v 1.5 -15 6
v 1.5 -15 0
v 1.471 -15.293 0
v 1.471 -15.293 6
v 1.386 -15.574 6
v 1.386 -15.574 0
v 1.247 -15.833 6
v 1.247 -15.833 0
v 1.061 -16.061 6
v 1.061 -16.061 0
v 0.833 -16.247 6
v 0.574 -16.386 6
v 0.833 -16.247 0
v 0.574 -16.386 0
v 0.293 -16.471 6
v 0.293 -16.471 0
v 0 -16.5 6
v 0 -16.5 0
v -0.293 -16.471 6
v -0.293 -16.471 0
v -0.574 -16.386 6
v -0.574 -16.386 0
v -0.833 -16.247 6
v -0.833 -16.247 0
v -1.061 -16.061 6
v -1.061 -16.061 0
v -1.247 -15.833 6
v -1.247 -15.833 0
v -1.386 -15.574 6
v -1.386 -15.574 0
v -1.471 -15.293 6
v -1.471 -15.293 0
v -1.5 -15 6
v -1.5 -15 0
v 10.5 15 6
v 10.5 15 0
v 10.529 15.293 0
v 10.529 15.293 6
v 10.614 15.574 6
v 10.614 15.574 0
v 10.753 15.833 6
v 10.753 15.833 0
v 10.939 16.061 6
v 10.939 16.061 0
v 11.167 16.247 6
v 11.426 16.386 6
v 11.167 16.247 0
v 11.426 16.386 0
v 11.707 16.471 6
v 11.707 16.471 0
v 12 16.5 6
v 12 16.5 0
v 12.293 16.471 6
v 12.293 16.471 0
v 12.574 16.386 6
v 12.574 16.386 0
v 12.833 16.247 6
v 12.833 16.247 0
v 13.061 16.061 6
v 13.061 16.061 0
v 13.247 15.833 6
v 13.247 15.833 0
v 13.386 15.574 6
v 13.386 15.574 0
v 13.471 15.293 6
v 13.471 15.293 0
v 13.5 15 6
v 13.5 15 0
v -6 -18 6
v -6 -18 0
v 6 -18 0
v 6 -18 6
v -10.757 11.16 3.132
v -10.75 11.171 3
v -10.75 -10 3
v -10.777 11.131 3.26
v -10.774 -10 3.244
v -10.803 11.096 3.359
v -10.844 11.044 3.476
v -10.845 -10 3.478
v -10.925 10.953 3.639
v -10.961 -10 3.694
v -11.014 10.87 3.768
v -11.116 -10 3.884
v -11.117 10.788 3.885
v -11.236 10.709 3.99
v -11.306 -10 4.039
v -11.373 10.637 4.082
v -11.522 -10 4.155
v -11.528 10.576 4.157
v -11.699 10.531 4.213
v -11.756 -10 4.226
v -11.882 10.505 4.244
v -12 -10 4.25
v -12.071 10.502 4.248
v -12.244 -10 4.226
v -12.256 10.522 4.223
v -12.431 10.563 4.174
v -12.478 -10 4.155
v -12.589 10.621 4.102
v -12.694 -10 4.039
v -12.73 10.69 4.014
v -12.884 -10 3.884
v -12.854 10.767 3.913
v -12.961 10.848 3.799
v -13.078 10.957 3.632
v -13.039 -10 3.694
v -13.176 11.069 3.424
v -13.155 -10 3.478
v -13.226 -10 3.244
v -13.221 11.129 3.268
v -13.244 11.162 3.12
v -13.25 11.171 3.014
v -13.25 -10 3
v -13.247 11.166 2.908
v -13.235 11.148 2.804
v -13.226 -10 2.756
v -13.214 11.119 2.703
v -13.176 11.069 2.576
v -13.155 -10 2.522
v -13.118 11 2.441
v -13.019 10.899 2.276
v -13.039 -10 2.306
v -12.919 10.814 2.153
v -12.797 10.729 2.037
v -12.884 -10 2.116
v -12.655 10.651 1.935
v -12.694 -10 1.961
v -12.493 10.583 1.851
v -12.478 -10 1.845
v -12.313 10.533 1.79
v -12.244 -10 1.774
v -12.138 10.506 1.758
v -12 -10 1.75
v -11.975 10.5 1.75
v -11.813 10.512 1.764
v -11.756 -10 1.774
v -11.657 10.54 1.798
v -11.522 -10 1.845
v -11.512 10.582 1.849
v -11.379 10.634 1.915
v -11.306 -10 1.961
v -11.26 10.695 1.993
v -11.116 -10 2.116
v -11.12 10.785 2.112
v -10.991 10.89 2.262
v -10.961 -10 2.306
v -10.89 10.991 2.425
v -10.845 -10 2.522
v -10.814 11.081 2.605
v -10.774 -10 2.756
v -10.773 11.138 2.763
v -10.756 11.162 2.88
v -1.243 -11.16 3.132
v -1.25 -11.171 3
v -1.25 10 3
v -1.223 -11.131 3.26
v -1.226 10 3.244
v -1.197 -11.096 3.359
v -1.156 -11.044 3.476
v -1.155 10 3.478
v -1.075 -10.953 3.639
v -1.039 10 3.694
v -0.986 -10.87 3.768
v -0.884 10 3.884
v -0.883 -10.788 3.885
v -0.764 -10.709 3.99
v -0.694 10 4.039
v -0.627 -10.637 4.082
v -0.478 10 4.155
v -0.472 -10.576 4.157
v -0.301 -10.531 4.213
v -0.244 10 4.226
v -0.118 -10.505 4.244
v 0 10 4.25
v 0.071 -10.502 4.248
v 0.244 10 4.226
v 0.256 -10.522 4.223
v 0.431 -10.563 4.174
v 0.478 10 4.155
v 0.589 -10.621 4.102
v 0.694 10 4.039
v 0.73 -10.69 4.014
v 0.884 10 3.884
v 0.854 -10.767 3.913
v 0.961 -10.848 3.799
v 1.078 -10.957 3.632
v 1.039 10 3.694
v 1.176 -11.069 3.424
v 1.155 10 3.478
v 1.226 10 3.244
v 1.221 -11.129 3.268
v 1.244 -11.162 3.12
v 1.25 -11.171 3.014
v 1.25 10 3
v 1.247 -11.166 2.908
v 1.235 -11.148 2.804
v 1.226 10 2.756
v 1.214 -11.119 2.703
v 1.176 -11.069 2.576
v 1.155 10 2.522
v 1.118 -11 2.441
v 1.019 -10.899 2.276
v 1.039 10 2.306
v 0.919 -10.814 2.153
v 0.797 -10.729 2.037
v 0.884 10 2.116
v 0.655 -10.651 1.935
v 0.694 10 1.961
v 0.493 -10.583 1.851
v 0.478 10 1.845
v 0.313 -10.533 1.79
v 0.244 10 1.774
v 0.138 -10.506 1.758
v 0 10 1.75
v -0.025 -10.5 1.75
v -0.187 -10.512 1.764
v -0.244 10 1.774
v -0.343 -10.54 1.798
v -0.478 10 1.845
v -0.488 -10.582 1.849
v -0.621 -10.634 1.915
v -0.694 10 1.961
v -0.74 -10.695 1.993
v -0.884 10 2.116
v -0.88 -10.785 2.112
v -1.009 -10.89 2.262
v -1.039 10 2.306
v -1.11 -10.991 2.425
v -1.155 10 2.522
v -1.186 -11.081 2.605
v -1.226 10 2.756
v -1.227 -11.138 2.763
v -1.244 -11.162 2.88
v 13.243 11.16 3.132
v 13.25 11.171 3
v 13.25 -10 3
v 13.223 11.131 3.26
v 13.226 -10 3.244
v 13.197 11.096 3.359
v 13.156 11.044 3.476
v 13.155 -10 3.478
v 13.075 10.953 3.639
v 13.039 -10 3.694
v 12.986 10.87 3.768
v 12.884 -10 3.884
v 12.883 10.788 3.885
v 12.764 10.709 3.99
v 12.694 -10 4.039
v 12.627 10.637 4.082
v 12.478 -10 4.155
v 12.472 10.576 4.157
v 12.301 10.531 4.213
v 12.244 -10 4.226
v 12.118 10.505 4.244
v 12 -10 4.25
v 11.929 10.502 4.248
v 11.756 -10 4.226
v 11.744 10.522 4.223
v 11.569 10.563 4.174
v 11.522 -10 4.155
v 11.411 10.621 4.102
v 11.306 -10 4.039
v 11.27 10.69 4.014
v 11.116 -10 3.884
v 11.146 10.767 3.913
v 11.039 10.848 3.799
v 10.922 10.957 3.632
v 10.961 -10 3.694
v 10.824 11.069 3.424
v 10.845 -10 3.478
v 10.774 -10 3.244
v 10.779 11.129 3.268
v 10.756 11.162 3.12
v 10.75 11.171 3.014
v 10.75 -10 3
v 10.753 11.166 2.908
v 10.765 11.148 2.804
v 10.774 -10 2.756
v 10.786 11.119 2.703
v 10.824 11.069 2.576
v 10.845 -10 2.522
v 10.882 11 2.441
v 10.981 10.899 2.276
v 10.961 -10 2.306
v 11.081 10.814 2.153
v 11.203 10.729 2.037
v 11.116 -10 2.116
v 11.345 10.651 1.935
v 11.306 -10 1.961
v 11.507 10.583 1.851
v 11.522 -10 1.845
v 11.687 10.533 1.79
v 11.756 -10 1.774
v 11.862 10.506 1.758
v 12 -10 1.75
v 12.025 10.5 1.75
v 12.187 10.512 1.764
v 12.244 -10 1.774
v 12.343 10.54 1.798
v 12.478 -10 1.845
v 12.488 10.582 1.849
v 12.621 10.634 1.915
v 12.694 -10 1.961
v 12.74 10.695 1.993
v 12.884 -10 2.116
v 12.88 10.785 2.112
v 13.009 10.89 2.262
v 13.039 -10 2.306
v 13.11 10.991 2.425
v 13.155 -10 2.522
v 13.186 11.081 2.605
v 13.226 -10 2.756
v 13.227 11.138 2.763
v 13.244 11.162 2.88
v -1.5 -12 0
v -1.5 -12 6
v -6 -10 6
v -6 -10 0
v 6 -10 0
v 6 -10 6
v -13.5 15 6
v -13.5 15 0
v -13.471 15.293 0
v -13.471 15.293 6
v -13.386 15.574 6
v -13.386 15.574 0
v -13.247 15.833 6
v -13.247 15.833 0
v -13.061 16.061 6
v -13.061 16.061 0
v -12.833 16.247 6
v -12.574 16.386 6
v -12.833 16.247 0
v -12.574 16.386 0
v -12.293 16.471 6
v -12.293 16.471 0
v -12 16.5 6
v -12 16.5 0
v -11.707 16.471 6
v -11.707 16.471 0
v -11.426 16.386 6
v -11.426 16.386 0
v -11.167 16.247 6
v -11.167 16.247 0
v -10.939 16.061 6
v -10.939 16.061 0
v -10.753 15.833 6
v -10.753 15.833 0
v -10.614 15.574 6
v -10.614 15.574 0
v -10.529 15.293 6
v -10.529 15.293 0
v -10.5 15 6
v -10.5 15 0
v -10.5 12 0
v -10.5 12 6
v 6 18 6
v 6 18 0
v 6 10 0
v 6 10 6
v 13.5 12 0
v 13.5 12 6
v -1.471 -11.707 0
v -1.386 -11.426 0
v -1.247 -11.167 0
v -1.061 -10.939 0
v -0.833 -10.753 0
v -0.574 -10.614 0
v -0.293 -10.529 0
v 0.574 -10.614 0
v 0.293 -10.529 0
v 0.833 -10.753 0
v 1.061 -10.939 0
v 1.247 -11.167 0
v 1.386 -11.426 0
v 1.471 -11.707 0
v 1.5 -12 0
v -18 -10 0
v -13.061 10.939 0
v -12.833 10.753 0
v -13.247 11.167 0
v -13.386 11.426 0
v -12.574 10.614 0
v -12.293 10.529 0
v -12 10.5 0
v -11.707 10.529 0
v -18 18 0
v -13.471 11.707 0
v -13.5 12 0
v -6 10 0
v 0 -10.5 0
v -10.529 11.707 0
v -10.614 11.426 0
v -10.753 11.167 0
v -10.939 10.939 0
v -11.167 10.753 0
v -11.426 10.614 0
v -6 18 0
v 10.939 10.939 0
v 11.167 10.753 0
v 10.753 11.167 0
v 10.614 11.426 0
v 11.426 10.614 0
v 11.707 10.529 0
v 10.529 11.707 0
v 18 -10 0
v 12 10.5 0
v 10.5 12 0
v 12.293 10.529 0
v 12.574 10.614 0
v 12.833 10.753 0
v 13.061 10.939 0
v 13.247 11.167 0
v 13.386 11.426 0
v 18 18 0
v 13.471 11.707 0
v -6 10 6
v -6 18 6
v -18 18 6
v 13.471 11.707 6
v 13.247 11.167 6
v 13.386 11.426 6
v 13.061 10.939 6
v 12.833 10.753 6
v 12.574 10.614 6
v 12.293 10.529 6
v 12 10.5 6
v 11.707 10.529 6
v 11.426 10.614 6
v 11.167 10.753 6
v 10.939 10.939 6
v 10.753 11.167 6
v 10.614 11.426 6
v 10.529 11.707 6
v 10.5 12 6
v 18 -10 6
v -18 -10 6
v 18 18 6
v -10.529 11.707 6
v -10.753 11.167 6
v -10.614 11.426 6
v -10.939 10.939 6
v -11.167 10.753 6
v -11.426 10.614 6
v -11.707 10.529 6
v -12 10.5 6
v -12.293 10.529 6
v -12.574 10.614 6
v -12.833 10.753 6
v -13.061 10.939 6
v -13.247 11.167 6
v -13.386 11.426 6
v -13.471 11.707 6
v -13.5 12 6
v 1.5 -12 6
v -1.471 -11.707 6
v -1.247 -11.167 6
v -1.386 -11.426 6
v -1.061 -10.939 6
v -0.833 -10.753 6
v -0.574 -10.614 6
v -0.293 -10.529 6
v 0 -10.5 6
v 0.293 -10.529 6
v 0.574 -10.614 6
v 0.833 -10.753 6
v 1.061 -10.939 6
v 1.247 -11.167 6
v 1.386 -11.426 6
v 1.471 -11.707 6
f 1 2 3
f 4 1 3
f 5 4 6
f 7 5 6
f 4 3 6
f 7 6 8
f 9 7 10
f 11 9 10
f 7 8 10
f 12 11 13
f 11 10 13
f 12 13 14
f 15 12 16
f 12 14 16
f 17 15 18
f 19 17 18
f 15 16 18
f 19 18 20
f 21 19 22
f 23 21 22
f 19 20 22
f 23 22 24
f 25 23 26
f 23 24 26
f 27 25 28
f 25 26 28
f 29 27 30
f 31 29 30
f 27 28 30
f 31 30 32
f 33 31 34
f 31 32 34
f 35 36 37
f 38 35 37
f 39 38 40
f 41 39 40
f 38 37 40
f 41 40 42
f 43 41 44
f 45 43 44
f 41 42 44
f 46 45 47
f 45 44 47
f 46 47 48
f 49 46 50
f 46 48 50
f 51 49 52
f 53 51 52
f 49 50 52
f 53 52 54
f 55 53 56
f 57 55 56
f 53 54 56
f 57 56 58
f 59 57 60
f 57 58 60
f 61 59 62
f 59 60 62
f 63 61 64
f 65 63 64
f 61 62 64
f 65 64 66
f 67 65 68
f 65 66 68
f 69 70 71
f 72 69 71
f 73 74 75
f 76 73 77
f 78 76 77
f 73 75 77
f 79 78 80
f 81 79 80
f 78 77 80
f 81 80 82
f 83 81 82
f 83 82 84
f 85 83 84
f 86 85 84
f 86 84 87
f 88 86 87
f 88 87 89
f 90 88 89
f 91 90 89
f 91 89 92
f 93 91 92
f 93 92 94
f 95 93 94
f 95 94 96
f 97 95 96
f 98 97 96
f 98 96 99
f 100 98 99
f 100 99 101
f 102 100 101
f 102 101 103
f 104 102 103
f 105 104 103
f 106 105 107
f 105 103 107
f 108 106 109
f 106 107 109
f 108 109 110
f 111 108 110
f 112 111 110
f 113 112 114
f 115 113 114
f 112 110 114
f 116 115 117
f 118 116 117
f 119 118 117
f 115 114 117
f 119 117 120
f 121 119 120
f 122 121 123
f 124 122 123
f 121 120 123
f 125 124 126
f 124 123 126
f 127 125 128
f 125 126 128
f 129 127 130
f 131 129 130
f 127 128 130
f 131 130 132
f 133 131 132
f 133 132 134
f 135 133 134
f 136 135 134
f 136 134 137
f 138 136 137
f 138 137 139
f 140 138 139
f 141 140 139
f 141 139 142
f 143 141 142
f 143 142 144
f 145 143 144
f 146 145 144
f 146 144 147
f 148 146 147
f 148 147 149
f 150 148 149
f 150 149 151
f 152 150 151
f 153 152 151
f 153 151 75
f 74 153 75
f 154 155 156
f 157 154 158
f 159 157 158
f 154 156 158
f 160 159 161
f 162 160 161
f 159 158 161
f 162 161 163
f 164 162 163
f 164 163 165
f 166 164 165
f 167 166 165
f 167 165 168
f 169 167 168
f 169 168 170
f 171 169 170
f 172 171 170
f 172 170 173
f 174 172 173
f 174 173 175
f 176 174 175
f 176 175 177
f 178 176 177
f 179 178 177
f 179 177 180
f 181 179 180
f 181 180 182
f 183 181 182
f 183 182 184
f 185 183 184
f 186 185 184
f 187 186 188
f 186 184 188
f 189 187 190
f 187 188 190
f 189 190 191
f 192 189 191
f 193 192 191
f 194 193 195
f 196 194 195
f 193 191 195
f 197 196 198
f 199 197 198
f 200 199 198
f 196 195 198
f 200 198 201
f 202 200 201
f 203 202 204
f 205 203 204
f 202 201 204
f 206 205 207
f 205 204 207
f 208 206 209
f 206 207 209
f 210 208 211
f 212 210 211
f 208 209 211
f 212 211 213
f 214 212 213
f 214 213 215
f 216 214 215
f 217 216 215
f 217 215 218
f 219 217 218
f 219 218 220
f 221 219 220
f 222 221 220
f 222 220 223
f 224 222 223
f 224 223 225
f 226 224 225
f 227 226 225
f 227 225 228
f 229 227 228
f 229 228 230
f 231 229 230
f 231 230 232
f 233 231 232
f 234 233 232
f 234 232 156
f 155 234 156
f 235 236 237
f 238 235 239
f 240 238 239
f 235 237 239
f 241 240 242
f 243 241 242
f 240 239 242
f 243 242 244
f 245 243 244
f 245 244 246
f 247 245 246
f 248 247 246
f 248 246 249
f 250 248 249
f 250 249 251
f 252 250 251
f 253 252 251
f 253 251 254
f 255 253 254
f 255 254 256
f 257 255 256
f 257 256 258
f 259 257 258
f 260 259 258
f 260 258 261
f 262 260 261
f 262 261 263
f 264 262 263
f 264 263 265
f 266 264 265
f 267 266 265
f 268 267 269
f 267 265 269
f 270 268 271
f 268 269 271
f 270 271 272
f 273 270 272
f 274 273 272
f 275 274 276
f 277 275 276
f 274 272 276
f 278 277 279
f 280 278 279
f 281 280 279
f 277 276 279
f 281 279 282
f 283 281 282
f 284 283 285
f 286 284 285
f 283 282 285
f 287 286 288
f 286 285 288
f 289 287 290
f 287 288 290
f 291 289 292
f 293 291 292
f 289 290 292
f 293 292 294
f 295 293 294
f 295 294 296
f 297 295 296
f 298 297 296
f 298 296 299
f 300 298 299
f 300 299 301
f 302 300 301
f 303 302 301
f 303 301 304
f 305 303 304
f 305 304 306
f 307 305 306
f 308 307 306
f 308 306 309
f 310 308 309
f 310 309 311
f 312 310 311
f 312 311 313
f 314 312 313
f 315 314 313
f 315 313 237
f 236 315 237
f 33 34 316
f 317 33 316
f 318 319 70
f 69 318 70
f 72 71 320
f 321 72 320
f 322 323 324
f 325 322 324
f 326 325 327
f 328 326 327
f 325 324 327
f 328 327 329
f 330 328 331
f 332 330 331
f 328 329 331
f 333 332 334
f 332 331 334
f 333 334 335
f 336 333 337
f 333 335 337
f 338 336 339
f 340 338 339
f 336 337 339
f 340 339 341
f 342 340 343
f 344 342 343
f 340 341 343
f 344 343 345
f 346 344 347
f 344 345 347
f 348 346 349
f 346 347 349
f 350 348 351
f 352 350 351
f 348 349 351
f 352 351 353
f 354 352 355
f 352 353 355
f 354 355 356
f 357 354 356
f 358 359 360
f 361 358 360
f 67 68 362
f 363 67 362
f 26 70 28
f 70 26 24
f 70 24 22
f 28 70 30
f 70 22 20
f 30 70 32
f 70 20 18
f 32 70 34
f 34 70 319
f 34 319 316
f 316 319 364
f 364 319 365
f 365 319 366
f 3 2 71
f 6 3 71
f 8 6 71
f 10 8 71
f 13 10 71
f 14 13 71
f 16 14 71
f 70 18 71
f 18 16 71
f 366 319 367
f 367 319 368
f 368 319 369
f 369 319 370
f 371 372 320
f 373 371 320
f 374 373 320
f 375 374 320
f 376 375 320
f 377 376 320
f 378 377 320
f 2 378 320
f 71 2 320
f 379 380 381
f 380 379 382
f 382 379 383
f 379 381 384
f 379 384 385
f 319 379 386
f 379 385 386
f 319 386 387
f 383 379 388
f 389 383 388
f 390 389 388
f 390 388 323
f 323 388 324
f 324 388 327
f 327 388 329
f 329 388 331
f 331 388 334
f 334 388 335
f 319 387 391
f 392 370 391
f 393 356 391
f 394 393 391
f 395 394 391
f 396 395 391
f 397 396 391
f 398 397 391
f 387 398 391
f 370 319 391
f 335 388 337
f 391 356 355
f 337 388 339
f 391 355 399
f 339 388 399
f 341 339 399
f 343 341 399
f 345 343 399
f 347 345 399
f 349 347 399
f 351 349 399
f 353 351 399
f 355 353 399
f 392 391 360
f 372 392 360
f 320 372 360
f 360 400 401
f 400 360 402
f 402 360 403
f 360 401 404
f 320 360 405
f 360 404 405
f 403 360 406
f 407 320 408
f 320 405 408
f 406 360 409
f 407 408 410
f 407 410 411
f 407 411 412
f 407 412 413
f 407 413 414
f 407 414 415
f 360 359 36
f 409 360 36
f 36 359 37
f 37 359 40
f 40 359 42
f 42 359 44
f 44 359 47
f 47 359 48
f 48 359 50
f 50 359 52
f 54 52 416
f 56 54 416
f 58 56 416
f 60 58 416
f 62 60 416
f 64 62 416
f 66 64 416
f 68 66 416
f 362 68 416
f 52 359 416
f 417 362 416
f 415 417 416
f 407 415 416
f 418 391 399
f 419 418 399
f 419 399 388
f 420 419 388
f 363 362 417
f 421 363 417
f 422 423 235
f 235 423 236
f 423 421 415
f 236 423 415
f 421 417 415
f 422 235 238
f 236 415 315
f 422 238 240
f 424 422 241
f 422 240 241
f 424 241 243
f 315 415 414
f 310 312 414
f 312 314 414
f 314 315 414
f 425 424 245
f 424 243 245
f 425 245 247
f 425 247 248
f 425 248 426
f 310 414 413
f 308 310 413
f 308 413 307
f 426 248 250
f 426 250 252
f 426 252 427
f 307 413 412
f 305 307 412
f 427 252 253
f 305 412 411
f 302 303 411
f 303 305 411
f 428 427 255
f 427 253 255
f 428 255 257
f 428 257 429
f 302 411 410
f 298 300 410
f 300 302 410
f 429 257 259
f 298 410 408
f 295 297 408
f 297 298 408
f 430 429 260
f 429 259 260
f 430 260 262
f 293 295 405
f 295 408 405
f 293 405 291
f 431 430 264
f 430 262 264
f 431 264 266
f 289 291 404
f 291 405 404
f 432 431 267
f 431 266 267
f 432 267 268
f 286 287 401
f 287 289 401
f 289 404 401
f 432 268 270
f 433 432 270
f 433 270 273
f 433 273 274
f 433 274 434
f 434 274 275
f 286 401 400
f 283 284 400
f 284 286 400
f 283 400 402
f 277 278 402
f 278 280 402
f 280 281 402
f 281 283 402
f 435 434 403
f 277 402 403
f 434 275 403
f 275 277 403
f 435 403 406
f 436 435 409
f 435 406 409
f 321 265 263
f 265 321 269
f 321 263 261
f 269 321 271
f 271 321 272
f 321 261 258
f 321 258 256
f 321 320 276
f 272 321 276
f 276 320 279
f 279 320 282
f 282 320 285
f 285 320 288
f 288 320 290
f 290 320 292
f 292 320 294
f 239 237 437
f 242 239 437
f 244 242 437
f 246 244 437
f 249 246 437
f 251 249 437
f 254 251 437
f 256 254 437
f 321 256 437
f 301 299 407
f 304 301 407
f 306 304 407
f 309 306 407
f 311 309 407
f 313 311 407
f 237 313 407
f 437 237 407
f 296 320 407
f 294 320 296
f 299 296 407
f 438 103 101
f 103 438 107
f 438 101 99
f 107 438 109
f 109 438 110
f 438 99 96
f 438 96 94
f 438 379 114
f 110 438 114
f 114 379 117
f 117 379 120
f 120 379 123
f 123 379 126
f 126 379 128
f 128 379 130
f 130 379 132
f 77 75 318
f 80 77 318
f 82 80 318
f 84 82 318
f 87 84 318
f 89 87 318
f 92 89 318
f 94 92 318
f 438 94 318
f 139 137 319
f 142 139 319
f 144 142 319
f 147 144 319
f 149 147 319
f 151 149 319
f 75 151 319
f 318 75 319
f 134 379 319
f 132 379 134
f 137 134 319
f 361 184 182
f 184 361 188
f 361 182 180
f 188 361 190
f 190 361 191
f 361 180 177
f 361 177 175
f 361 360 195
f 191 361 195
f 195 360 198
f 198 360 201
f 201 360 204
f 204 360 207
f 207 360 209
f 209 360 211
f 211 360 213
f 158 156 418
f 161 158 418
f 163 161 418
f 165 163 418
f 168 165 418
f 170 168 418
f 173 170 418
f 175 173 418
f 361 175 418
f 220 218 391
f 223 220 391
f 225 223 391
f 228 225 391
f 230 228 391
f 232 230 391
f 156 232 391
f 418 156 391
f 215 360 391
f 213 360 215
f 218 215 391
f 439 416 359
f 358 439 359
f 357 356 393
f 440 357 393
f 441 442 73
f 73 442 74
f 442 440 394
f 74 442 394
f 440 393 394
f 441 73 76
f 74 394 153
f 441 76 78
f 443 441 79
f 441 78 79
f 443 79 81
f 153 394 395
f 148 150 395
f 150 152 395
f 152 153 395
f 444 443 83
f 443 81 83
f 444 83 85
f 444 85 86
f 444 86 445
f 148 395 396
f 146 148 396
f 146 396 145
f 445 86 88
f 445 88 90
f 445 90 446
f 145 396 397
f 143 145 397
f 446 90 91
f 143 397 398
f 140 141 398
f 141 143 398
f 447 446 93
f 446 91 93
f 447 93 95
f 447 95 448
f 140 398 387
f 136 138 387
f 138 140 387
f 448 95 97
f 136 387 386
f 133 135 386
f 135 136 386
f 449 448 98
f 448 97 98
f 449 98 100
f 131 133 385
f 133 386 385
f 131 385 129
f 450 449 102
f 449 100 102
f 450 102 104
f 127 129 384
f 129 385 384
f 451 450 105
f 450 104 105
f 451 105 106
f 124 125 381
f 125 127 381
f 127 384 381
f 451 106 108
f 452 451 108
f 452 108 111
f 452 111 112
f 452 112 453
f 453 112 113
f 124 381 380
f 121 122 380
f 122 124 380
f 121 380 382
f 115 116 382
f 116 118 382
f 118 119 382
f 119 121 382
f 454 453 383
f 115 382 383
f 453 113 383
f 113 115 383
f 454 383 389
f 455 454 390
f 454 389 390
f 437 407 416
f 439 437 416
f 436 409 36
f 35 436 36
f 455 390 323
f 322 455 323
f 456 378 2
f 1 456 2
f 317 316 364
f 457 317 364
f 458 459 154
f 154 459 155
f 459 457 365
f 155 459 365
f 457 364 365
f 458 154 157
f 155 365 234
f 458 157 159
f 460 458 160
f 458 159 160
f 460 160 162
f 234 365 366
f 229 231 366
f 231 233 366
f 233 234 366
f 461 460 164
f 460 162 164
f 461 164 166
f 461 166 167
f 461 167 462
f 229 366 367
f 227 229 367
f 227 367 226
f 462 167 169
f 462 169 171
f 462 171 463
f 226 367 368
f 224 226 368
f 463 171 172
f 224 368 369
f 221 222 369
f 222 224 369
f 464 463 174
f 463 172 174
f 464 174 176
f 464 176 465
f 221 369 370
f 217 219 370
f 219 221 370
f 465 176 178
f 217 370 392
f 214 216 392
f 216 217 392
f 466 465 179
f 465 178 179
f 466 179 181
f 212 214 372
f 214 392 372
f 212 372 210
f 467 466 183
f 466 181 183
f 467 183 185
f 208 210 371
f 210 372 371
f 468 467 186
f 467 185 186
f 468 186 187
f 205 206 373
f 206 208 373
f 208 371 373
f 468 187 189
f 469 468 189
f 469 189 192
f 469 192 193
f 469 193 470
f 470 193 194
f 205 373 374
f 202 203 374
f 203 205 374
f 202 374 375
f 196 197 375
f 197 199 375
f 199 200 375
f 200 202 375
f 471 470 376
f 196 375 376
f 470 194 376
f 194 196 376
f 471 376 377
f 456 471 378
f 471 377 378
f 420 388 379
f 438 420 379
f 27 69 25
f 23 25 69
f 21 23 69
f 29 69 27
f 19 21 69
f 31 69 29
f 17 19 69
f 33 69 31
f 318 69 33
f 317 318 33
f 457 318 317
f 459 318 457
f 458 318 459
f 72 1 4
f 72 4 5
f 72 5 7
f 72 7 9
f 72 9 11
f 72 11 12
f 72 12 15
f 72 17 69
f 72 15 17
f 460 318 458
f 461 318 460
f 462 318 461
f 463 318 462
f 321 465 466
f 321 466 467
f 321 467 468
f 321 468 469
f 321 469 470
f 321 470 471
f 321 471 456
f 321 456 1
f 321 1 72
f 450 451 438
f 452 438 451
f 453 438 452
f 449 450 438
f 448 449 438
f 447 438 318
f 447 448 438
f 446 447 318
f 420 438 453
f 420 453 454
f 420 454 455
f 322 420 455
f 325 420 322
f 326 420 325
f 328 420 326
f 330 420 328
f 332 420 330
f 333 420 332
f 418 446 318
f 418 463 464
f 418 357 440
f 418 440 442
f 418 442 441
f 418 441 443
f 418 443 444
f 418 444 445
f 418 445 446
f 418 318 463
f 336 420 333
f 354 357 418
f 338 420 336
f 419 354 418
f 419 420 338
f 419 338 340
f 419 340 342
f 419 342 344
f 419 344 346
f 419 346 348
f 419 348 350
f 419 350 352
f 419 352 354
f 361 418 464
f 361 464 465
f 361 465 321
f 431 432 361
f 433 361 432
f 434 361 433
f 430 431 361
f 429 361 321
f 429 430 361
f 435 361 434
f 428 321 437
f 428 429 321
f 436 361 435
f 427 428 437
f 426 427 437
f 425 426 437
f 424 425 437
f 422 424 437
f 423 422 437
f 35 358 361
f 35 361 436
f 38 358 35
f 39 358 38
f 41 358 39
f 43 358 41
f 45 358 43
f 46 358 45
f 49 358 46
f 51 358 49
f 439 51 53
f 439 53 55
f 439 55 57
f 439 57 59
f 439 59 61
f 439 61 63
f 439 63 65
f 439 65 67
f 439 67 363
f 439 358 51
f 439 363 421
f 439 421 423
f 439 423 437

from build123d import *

# Parameters (mm, degrees)
F1_DEPTH = 6
F2_DEPTH = 6
F3_R     = 1.25
F4_DEPTH = 21.1718439024
F5_R     = 1.25
F6_DEPTH = 21.1718439024


with BuildPart() as f1:
    # F0 (on Top) → F1 (new body)
    with BuildSketch(Plane.XY):
        Polygon((-6, -18), (6, -18), (6, -10), (18, -10), (18, 18), (6, 18), (6, 10), (-6, 10), (-6, 18), (-18, 18), (-18, -10), (-6, -10), align=None)
        with BuildLine():
            Line((1.5, -12), (1.5, -15))
            ThreePointArc((1.5, -15), (0, -16.5), (-1.5, -15))
            Line((-1.5, -15), (-1.5, -12))
            ThreePointArc((-1.5, -12), (0, -10.5), (1.5, -12))
        make_face(mode=Mode.SUBTRACT)
        with BuildLine():
            ThreePointArc((-13.5, 15), (-12, 16.5), (-10.5, 15))
            Line((-10.5, 15), (-10.5, 12))
            ThreePointArc((-10.5, 12), (-12, 10.5), (-13.5, 12))
            Line((-13.5, 12), (-13.5, 15))
        make_face(mode=Mode.SUBTRACT)
        with BuildLine():
            Line((10.5, 12), (10.5, 15))
            ThreePointArc((10.5, 15), (12, 16.5), (13.5, 15))
            Line((13.5, 15), (13.5, 12))
            ThreePointArc((13.5, 12), (12, 10.5), (10.5, 12))
        make_face(mode=Mode.SUBTRACT)
    extrude(amount=F1_DEPTH)

    # F0 (on Top) → F2 (join)
    with BuildSketch(Plane.XY):
        Polygon((-6, -18), (6, -18), (6, -10), (18, -10), (18, 18), (6, 18), (6, 10), (-6, 10), (-6, 18), (-18, 18), (-18, -10), (-6, -10), align=None)
        with BuildLine():
            Line((1.5, -12), (1.5, -15))
            ThreePointArc((1.5, -15), (0, -16.5), (-1.5, -15))
            Line((-1.5, -15), (-1.5, -12))
            ThreePointArc((-1.5, -12), (0, -10.5), (1.5, -12))
        make_face(mode=Mode.SUBTRACT)
        with BuildLine():
            ThreePointArc((-13.5, 15), (-12, 16.5), (-10.5, 15))
            Line((-10.5, 15), (-10.5, 12))
            ThreePointArc((-10.5, 12), (-12, 10.5), (-13.5, 12))
            Line((-13.5, 12), (-13.5, 15))
        make_face(mode=Mode.SUBTRACT)
        with BuildLine():
            Line((10.5, 12), (10.5, 15))
            ThreePointArc((10.5, 15), (12, 16.5), (13.5, 15))
            Line((13.5, 15), (13.5, 12))
            ThreePointArc((13.5, 12), (12, 10.5), (10.5, 12))
        make_face(mode=Mode.SUBTRACT)
    extrude(amount=F2_DEPTH)

    # F3 (on face) → F4 (cut, through all)
    with BuildSketch(Plane.XZ.offset(10)):
        with Locations((-12, 3)):
            Circle(F3_R)
        with Locations((12, 3)):
            Circle(F3_R)
    extrude(amount=-F4_DEPTH, mode=Mode.SUBTRACT)

    # F5 (on face) → F6 (cut, through all)
    with BuildSketch(Plane(origin=(0, 10, 0), x_dir=(-1, 0, 0), z_dir=(0, 1, 0))):
        with Locations((0, 3)):
            Circle(F5_R)
    extrude(amount=-F6_DEPTH, mode=Mode.SUBTRACT)


solid = f1.part
